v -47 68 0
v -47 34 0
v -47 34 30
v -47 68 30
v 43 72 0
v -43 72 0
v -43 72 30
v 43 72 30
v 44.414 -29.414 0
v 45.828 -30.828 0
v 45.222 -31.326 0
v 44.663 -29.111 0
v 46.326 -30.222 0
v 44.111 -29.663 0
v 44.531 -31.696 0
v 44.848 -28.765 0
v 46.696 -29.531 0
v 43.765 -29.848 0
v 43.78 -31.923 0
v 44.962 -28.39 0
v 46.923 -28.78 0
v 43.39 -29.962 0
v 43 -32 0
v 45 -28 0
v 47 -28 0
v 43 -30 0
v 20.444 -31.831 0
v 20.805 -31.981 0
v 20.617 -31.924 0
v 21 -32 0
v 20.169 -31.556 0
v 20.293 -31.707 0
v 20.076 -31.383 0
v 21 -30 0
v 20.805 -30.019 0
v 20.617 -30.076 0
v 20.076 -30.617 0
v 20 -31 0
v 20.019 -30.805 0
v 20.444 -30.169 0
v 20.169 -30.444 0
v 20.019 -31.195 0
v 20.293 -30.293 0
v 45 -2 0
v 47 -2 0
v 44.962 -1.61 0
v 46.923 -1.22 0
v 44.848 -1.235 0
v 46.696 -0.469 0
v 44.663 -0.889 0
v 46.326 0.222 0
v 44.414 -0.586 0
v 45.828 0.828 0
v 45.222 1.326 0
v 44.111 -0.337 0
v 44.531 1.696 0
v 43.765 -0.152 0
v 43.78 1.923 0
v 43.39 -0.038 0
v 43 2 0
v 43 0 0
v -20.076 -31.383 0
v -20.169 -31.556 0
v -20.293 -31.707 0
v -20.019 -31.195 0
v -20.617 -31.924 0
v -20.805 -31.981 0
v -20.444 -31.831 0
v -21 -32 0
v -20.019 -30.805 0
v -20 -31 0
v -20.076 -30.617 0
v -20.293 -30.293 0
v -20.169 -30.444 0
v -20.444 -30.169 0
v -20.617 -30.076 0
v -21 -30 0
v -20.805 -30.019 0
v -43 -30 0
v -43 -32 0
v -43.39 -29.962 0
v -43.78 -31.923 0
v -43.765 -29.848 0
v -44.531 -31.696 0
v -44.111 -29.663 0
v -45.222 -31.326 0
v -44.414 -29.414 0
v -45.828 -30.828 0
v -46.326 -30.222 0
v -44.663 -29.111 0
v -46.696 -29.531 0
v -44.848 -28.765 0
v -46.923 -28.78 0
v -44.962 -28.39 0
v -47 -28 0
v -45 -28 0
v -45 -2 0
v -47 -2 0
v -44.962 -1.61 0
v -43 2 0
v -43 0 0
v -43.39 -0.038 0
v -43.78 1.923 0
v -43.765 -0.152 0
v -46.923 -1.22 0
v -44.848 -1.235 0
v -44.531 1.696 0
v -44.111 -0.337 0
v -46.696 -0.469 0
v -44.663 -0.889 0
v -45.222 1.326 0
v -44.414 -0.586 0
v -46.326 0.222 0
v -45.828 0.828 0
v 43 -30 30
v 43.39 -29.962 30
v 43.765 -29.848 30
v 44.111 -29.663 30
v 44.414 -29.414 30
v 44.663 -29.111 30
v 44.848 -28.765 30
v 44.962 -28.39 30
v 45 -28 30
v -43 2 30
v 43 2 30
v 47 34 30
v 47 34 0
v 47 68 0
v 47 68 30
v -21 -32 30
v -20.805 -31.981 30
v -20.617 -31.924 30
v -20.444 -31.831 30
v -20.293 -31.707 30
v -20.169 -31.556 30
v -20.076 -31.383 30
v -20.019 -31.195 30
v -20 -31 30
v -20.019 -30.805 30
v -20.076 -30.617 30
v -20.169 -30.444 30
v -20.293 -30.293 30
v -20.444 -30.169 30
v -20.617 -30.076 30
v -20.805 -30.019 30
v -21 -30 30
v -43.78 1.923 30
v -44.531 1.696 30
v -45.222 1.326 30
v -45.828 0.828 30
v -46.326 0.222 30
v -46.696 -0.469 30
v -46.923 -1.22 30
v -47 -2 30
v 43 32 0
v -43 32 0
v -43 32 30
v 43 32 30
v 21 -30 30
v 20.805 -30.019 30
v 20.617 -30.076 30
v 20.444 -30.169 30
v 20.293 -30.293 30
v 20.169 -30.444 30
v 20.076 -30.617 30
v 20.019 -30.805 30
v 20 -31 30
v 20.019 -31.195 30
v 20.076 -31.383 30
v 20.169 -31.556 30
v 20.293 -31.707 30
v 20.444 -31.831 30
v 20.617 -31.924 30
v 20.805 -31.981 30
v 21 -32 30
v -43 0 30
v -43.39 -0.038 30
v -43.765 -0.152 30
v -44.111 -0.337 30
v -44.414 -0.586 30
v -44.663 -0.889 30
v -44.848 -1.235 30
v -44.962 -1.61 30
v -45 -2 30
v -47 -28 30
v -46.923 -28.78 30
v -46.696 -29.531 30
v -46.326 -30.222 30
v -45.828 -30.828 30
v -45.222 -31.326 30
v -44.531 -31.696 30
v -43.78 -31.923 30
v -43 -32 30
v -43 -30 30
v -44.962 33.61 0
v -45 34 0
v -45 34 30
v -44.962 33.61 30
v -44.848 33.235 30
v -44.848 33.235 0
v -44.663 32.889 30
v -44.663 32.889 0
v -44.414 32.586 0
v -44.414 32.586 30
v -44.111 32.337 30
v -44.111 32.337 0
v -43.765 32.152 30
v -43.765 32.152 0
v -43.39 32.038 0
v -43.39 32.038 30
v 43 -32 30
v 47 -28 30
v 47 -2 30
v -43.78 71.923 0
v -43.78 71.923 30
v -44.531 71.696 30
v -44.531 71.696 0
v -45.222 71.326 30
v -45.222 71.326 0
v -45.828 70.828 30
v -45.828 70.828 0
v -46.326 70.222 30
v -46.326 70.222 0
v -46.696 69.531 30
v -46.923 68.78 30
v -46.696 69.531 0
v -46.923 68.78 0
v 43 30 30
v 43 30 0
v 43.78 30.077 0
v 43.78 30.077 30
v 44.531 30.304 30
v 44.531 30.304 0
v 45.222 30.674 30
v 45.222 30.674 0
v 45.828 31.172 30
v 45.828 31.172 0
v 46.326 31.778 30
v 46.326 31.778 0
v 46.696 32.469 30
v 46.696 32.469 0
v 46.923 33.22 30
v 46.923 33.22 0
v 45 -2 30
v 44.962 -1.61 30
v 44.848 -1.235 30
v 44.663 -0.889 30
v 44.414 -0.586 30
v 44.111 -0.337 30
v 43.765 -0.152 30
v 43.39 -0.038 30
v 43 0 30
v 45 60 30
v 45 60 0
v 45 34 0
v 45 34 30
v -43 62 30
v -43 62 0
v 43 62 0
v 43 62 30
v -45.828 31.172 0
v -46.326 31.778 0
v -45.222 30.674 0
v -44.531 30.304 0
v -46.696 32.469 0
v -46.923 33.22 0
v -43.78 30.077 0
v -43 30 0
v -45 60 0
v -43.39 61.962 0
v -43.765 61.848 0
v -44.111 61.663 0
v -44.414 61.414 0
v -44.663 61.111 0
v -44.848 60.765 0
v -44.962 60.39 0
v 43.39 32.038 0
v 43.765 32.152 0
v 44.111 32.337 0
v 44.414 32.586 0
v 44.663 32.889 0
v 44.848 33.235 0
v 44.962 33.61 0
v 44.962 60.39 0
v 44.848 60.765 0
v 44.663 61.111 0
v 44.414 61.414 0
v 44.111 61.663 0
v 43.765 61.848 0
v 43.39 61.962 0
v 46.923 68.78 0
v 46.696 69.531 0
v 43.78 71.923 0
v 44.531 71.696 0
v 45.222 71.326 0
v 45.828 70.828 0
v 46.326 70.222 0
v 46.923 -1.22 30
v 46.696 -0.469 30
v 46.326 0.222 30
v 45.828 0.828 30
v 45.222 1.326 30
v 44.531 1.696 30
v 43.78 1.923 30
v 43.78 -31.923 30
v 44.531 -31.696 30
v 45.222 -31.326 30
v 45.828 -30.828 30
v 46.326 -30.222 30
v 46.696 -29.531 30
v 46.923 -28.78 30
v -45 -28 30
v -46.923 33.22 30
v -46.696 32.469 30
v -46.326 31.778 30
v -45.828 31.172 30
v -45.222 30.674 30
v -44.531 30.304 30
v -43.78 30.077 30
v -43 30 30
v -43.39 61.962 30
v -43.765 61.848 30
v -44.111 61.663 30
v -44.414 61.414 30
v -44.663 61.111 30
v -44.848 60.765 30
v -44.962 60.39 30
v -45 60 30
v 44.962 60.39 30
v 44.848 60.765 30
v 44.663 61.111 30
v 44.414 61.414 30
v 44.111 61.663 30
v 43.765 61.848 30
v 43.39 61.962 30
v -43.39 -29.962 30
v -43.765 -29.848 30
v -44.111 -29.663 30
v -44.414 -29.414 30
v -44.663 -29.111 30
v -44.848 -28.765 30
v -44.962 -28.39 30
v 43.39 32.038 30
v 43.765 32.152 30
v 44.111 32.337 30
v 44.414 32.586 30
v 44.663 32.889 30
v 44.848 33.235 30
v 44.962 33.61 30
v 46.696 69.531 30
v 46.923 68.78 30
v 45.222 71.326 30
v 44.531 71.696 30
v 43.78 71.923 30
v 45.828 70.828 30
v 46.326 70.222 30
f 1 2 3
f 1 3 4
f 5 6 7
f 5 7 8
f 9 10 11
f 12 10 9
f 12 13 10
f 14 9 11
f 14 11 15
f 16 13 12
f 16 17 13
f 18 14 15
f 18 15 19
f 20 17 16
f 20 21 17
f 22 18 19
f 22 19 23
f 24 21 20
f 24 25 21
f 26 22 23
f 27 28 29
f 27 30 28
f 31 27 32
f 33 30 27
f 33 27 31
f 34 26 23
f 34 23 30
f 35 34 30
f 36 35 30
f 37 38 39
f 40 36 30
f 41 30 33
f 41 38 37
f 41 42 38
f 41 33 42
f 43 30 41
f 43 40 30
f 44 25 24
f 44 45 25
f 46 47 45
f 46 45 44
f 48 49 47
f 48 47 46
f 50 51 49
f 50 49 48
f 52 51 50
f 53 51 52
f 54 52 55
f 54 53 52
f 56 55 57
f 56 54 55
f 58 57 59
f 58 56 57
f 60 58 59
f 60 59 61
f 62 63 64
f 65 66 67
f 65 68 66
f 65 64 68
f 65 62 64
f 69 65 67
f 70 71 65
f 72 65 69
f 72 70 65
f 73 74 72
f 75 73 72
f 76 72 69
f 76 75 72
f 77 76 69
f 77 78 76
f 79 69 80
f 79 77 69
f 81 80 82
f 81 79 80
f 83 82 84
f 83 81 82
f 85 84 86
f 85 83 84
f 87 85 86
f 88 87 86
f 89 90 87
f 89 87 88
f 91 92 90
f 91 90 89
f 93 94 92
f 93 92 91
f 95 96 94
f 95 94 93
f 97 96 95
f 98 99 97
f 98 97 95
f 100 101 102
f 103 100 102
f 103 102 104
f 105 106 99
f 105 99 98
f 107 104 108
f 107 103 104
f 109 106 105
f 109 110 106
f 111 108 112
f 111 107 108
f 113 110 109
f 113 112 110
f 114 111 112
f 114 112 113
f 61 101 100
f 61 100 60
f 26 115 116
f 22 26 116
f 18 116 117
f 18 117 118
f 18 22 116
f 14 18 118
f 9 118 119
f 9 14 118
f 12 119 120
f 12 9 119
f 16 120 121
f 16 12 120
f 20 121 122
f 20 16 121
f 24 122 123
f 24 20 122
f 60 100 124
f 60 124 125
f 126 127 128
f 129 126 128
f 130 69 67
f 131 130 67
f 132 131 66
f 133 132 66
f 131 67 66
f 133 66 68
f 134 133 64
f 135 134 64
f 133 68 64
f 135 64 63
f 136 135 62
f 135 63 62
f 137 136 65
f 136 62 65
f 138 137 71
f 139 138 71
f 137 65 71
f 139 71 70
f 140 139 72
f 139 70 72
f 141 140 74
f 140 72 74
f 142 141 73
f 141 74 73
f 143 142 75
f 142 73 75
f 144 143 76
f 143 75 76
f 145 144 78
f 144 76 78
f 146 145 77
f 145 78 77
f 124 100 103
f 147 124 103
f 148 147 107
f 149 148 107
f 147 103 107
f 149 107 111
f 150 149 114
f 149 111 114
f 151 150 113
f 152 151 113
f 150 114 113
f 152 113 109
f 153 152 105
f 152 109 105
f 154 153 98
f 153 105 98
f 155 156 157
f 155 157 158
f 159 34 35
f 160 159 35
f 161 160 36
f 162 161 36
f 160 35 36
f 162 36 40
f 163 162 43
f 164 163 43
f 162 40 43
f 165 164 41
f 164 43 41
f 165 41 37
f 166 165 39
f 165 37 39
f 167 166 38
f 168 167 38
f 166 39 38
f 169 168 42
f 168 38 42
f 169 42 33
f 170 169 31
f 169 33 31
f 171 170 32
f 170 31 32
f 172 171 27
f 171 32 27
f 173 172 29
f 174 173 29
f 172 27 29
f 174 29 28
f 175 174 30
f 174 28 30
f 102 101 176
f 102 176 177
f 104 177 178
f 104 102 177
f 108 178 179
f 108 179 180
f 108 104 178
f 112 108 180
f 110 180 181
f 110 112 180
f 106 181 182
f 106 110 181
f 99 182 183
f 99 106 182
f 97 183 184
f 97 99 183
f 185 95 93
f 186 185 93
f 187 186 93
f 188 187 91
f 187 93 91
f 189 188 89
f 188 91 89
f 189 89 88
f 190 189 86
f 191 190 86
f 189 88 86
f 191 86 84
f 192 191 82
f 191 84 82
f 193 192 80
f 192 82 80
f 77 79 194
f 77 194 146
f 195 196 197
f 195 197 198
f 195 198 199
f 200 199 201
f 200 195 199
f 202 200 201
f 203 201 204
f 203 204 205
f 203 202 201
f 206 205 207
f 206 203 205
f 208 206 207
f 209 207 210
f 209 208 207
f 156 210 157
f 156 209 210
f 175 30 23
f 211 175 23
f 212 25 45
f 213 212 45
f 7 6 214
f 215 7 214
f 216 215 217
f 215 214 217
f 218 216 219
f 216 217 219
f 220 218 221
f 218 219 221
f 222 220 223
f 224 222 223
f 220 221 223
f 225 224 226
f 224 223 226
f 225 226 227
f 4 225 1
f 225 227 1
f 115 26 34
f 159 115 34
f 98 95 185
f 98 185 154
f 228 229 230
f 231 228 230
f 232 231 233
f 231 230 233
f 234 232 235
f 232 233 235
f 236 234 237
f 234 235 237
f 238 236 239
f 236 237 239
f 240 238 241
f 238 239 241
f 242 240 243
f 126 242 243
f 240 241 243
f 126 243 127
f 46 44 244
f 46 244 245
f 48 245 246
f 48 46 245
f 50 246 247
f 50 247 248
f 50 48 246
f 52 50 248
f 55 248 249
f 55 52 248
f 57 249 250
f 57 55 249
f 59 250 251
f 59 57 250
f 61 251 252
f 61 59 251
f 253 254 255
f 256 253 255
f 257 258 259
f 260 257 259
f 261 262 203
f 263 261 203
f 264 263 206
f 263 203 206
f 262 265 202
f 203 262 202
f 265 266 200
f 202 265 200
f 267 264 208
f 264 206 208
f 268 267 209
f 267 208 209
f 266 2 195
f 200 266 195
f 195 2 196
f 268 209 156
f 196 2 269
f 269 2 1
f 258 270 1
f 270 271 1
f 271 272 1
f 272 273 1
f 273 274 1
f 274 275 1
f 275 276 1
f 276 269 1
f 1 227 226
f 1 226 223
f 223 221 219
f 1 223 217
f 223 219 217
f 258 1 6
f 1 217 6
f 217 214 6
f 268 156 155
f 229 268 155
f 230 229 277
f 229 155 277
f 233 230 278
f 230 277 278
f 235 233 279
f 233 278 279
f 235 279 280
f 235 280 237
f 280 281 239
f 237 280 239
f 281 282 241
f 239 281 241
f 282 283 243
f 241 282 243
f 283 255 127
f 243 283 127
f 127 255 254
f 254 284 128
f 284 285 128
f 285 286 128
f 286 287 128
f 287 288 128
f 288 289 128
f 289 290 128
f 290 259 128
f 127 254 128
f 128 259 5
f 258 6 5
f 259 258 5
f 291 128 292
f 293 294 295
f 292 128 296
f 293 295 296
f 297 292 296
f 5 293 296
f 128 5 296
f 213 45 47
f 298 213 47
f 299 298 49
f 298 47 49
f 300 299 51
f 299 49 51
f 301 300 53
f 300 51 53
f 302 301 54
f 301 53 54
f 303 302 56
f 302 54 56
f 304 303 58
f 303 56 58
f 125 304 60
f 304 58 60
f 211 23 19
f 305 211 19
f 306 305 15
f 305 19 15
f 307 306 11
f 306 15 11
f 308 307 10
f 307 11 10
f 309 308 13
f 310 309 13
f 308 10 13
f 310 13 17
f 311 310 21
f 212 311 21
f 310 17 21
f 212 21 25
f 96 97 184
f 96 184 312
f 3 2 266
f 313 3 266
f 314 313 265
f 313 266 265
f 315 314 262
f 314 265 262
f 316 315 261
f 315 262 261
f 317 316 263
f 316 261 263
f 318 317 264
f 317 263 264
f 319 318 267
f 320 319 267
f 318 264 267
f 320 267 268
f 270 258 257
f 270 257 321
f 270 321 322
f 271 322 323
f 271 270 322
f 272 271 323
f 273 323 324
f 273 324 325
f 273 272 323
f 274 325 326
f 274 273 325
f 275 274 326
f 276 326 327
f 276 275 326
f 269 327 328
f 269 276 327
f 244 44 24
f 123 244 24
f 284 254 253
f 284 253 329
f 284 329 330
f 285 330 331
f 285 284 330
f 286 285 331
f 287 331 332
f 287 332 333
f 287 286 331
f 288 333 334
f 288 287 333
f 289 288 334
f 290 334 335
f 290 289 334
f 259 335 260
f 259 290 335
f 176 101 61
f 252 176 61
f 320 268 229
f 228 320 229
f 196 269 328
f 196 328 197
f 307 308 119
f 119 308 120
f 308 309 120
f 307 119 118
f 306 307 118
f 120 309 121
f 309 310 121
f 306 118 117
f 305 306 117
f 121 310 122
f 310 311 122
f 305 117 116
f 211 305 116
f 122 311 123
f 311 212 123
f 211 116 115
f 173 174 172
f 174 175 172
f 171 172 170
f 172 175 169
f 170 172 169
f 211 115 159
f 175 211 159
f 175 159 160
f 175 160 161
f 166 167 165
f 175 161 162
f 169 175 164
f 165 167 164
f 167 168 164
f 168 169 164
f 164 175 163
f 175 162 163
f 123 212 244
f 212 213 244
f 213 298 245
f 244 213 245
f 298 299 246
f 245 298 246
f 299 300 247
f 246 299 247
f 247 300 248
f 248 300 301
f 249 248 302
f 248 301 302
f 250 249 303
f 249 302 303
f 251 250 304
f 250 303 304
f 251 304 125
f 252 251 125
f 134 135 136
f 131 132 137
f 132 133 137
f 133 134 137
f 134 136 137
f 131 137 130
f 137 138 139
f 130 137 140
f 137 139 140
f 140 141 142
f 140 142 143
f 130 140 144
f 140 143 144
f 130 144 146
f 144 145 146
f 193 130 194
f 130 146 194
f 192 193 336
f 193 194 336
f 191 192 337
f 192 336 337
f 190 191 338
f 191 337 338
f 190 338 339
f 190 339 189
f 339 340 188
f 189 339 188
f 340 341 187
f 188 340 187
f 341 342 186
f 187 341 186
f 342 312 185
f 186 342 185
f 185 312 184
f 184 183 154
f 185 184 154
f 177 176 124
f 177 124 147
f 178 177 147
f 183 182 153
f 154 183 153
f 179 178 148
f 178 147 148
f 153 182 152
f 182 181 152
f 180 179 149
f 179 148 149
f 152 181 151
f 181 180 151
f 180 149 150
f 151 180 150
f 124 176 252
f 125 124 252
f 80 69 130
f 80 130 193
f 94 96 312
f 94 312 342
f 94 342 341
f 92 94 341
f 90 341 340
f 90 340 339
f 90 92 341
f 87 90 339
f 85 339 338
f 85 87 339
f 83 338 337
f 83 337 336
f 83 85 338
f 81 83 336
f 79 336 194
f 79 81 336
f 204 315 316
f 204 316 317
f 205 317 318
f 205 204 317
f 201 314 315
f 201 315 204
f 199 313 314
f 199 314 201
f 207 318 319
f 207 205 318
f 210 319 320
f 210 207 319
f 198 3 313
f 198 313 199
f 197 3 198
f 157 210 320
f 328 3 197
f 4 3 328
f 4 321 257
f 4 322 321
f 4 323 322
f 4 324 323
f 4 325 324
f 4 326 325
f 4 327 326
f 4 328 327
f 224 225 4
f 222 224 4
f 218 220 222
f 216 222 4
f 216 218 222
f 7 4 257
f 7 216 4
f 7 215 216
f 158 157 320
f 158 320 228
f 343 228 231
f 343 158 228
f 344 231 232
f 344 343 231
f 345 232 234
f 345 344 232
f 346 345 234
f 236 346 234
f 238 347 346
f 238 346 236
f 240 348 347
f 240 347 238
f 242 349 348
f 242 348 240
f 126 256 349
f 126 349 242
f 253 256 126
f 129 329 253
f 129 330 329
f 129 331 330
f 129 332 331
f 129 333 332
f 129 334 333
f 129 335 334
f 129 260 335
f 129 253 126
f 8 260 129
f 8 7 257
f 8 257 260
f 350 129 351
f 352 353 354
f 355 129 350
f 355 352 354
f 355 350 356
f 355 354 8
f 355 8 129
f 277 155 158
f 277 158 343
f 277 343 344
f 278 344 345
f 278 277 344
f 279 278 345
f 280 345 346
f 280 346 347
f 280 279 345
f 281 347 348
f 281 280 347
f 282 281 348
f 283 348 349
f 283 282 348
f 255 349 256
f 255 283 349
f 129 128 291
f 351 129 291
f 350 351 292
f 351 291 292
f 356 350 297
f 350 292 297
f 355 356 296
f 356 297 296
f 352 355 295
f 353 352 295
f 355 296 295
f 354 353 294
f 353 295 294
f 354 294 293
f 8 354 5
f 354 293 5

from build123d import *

# Parameters (mm, degrees)
PAD_DEPTH    = 30
PAD001_DEPTH = 30


with BuildPart() as open:
    # Sketch → Pad (new body)
    with BuildSketch(Plane.XY):
        with BuildLine():
            ThreePointArc((-43, 0), (-44.414214, -0.585786), (-45, -2))
            Line((-45, -2), (-45, -28))
            ThreePointArc((-45, -28), (-44.414214, -29.414214), (-43, -30))
            Line((-43, -30), (-21, -30))
            ThreePointArc((-21, -32), (-20, -31), (-21, -30))
            Line((-21, -32), (-43, -32))
            ThreePointArc((-47, -28), (-45.828427, -30.828427), (-43, -32))
            Line((-47, -28), (-47, -2))
            ThreePointArc((-43, 2), (-45.828427, 0.828427), (-47, -2))
            Line((-43, 2), (43, 2))
            ThreePointArc((47, -2), (45.828427, 0.828427), (43, 2))
            Line((47, -28), (47, -2))
            ThreePointArc((42.999985, -32), (45.828422, -30.828432), (47, -28))
            Line((20.999985, -32), (42.999985, -32))
            ThreePointArc((20.999985, -30), (19.999976, -31), (20.999985, -32))
            Line((42.999985, -30), (20.999985, -30))
            ThreePointArc((42.999985, -30), (44.414208, -29.414219), (45, -28))
            Line((45, -2), (45, -28))
            ThreePointArc((45, -2), (44.414214, -0.585786), (43, 0))
            Line((-43, 0), (43, 0))
        make_face()
    extrude(amount=PAD_DEPTH)


with BuildPart() as closed:
    # Sketch001 → Pad001 (new body)
    with BuildSketch(Plane.XY):
        with BuildLine():
            ThreePointArc((-47, 34), (-45.828427, 31.171573), (-43, 30))
            Line((-43, 30), (43, 30))
            ThreePointArc((43, 30), (45.828427, 31.171573), (47, 34))
            Line((47, 34), (47, 67.999984))
            ThreePointArc((47, 67.999984), (45.828433, 70.828421), (43, 72))
            Line((-43, 72), (43, 72))
            ThreePointArc((-43, 72), (-45.828433, 70.828421), (-47, 67.999984))
            Line((-47, 34), (-47, 67.999984))
        make_face()
        with BuildLine():
            ThreePointArc((-43, 62), (-44.414214, 61.414214), (-45, 60))
            Line((-45, 60), (-45, 34))
            ThreePointArc((-45, 34), (-44.414214, 32.585786), (-43, 32))
            Line((-43, 32), (43, 32))
            ThreePointArc((43, 32), (44.414214, 32.585786), (45, 34))
            Line((45, 60), (45, 34))
            ThreePointArc((45, 60), (44.414214, 61.414214), (43, 62))
            Line((-43, 62), (43, 62))
        make_face(mode=Mode.SUBTRACT)
    extrude(amount=PAD001_DEPTH)


solid = Compound([open.part, closed.part])
